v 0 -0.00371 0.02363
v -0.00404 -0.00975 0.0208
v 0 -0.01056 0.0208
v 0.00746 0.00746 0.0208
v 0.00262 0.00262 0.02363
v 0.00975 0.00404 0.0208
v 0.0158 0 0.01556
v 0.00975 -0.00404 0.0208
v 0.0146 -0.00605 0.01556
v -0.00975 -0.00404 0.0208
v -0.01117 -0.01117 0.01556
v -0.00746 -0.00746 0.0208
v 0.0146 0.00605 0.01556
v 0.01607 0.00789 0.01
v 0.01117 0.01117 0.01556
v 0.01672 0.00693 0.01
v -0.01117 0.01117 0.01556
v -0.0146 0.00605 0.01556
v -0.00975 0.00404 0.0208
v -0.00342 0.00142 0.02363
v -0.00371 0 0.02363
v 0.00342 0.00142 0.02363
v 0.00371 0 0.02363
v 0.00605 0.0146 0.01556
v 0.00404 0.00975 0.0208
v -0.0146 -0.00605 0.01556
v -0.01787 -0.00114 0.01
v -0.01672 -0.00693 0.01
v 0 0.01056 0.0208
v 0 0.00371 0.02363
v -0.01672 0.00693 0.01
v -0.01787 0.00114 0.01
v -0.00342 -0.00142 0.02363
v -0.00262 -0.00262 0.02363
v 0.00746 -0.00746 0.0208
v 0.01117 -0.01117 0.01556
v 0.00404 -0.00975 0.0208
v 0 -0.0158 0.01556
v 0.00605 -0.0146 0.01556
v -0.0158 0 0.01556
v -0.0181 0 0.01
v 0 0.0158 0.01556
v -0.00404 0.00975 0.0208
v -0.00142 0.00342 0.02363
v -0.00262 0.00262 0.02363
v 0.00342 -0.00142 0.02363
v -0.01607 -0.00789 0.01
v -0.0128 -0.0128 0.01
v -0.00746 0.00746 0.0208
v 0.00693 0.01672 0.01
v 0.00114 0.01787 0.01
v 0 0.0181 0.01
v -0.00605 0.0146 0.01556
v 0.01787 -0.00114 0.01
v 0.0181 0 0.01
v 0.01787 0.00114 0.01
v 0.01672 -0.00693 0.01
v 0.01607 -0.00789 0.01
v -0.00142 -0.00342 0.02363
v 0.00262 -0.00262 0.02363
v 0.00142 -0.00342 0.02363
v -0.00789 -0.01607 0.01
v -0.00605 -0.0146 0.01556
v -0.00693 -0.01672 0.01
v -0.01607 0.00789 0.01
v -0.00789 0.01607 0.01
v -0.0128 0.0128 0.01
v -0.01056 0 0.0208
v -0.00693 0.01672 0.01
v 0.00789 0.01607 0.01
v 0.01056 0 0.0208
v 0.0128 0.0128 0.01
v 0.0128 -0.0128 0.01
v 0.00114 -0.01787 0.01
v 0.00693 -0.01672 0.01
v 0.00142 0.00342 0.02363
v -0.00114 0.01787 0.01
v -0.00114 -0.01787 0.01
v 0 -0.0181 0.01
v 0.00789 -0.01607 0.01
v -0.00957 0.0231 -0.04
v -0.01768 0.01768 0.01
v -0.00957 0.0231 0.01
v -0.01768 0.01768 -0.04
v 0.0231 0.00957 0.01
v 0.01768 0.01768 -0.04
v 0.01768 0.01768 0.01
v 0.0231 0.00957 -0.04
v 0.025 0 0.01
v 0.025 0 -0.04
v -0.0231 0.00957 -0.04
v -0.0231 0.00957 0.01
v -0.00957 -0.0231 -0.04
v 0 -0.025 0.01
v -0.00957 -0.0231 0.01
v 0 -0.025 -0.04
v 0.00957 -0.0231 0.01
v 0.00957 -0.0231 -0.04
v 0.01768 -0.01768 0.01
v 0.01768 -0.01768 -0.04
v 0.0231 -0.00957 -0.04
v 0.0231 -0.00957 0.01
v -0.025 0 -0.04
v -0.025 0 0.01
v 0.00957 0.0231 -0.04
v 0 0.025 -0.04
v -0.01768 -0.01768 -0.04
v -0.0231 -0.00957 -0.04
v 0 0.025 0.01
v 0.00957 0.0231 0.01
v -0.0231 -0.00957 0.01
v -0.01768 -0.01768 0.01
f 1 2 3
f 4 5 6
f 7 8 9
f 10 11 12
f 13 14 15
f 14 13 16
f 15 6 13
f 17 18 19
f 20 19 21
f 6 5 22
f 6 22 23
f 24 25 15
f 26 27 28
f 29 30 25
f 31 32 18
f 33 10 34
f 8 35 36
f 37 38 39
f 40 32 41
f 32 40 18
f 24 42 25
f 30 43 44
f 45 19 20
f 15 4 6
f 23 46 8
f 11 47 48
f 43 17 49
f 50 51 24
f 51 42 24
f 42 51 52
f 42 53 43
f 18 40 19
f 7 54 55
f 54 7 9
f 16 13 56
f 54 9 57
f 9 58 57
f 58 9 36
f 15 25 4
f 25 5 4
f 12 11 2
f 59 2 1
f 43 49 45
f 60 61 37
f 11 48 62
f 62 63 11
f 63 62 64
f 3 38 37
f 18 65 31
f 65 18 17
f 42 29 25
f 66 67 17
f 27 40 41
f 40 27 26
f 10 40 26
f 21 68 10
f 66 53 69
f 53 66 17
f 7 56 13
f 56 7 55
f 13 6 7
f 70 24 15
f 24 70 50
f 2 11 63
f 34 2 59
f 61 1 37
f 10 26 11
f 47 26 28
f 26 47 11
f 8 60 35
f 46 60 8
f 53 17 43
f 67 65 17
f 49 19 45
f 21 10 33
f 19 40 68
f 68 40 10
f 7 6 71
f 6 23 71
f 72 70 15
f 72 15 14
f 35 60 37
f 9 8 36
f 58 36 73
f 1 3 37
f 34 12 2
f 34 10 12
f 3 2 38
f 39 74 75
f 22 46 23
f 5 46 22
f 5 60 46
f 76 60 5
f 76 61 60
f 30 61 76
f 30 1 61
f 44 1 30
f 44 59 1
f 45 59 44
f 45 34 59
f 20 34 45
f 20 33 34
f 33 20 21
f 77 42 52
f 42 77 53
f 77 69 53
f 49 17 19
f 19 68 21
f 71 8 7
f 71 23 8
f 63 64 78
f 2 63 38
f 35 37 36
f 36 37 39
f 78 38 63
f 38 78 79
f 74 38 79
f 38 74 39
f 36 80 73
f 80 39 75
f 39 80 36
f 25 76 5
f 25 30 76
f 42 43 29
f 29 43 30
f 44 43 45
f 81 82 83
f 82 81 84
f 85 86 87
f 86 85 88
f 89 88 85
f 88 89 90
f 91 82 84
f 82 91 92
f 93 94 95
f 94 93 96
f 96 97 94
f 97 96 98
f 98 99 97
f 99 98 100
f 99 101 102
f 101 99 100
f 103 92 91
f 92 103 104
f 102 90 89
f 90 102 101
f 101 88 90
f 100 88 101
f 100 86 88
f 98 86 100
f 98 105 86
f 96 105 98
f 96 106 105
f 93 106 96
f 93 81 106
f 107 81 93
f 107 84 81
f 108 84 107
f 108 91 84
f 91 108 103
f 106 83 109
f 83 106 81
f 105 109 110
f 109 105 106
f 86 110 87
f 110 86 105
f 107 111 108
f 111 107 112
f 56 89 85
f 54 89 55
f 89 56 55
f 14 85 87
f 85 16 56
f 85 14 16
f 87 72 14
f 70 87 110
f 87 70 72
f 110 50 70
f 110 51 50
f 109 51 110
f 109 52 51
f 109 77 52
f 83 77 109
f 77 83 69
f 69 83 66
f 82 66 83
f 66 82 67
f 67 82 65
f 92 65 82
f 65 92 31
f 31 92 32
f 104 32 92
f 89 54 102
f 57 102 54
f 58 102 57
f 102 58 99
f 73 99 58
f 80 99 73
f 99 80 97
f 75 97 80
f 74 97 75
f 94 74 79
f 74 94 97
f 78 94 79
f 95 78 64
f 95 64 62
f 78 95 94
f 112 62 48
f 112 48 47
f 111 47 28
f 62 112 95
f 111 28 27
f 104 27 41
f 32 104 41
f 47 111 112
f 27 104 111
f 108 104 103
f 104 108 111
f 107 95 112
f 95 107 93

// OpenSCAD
use <lib.scad>

module rivetHD($fn=16) {
	union() {
		translate([0,0,0.005]) sphere(0.019);
		translate([0,0,-0.015]) cyl(0.025, 0.025, 0.05);
	}
}

module flangeHD() {
	rotate([0,90,0]) difference() {
		cyl(0.85,0.85,0.1);
		difference() {
			cyl(0.9,0.9,0.01);
			cyl(0.82,0.82,0.05);
		}
	}
}

module flangeLD() {
	rotate([0,90,0]) difference() {
		cyl(0.85,0.85,0.1);
	}
}

module fireboxHD($fn=64) {
	difference() {
		union() {
			hull() {
				translate([1.1,0,0]) rotate([0,90,0]) rotate_extrude(convexity=10) translate([0.6,0,0]) circle(r=0.2);
				translate([-1.1,0,0]) rotate([0,90,0]) rotate_extrude(convexity=10) translate([0.6,0,0]) circle(r=0.2);
			}
			translate([1.1,0,0]) flangeHD();
			translate([-1.1,0,0]) flangeHD();
		}
		translate([0,0,-0.5]) box([2.9,1.9,1.0]);
	}
}

module fireboxLD($fn=32) {
	difference() {
		union() {
			hull() {
				translate([1.1,0,0]) rotate([0,90,0]) rotate_extrude(convexity=10) translate([0.6,0,0]) circle(r=0.2);
				translate([-1.1,0,0]) rotate([0,90,0]) rotate_extrude(convexity=10) translate([0.6,0,0]) circle(r=0.2);
			}
			translate([1.1,0,0]) flangeLD();
			translate([-1.1,0,0]) flangeLD();
		}
		translate([0,0,-0.5]) box([2.9,1.9,1.0]);
	}
}

module fireboxVLD($fn=32) {
	difference() {
		rotate([0,90,0]) cyl(0.85, 0.85, 2.6, $fn=8);
		translate([0,0,-0.5]) box([2.9,1.9,1.0]);
	}
}

module stackHD($fn=32) {
	translate([0.6,0,0.5]) intersection() {
		translate([0,0,-0.5]) union() {
			difference() {
				cyl(0.3,0.3,2.0);
				cyl(0.25,0.25,2.1);
			}
			translate([0,0,0.1]) intersection() {
				rotate([0,90,0]) cyl(0.75,0.75,1.0);
				cyl(0.44,0.44,10);
			}
		}
		box([1,1,1]);
	}
}

module stackLD($fn=16) {
	translate([0.6,0,0.5]) intersection() {
		translate([0,0,-0.5]) union() {
			difference() {
				cyl(0.3,0.3,2.0);
				cyl(0.25,0.25,2.1);
			}
			translate([0,0,0.1]) intersection() {
				rotate([0,90,0]) cyl(0.75,0.75,1.0);
				cyl(0.44,0.44,10);
			}
		}
		box([1,1,1]);
	}
}

module coverHD($fn=32) {
	translate([0.6,0,0.81]) cyl(0.25,0.25,0.1);
}

module coverLD($fn=16) {
	translate([0.6,0,0.81]) cyl(0.25,0.25,0.1);
}

module chassisHD() {
	translate([0,0,-0.5]) rbox([2.9,1.9,1.0], 0.025, $fn=8);
}

module chassisLD() {
	translate([0,0,-0.5]) box([2.9,1.9,1.0]);
}

module chassisVLD() {
	translate([0,0,-0.5]) box([2.9,1.9,1.0]);
}

//chassisHD();
//chassisLD();
//chassisVLD();
//fireboxHD();
//fireboxLD();
//fireboxVLD();
//stackHD();
//stackLD();
//coverHD();
//coverLD();
rivetHD();

//for (i=[0:1:11]) translate([1.3,0,0]) rotate([i*30,0,0]) translate([0,0,0.55]) rotate([0,90,0]) rivet();
//for (i=[0:1:11]) translate([-1.3,0,0]) rotate([i*30,0,0]) translate([0,0,0.55]) rotate([0,-90,0]) rivet();
//for (i=[0:1:17]) translate([0.9,0,0]) rotate([i*20,0,0]) translate([0,0,0.8]) rivet();
//for (i=[0:1:17]) translate([-0.9,0,0]) rotate([i*20,0,0]) translate([0,0,0.8]) rivet();
//for (i=[0:1:17]) translate([0.3,0,0]) rotate([i*20,0,0]) translate([0,0,0.8]) rivet();
//for (i=[0:1:17]) translate([-0.3,0,0]) rotate([i*20,0,0]) translate([0,0,0.8]) rivet();
